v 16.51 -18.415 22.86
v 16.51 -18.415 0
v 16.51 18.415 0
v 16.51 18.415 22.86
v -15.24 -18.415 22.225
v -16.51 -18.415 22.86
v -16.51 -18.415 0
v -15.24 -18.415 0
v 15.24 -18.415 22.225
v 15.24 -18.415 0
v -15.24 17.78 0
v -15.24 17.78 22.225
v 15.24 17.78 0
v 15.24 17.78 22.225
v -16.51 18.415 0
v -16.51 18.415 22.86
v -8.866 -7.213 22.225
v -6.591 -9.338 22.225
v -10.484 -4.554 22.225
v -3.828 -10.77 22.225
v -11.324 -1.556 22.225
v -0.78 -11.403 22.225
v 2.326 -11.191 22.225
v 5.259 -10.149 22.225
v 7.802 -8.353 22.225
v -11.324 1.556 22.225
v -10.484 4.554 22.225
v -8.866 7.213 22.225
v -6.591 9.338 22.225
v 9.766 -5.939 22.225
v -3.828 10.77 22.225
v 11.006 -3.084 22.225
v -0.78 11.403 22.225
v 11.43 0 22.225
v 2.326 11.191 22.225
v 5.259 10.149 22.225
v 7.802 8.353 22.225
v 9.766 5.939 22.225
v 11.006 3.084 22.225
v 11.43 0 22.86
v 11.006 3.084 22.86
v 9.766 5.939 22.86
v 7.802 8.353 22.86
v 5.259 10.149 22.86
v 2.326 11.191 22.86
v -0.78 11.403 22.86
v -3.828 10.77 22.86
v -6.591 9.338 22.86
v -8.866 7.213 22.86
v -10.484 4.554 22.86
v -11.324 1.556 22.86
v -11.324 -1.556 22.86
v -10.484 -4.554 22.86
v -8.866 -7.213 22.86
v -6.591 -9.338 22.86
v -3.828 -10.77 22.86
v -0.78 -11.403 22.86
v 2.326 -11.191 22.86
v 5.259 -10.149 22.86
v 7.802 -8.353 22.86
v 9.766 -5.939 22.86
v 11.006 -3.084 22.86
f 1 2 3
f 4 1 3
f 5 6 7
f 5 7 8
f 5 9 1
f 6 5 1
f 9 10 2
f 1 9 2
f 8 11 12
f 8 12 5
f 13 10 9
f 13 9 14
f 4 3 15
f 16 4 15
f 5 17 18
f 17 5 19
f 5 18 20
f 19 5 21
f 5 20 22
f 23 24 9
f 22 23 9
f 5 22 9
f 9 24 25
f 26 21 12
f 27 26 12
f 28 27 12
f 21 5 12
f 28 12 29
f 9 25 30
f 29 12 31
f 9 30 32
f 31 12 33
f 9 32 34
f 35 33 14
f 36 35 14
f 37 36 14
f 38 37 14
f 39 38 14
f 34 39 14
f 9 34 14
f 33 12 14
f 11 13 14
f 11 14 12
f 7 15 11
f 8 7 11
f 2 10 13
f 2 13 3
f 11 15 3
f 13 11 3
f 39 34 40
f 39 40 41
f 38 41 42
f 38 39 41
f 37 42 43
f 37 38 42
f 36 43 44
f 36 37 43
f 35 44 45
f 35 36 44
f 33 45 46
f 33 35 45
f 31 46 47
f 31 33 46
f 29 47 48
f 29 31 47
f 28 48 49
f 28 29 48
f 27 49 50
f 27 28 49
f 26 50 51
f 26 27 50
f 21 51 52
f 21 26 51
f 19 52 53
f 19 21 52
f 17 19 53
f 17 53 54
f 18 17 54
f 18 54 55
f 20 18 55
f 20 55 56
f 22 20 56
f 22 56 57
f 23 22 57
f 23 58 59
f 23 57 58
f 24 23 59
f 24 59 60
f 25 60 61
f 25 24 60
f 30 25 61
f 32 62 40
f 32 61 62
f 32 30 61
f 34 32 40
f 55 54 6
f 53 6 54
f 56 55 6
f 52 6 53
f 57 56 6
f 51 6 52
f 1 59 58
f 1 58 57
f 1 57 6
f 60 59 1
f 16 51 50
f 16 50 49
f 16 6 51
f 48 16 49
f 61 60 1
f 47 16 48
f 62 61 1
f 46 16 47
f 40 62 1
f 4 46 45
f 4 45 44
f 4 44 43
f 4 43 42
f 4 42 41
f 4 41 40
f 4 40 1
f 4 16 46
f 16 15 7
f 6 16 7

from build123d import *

# Parameters (mm, degrees)
F1_DEPTH = 22.86
F2_R     = 11.43
F3_DEPTH = 22.861
F5_DEPTH = 22.225
F7_DEPTH = 11.9126


with BuildPart() as f1:
    # F0 (on Top) → F1 (new body)
    with BuildSketch(Plane.XY):
        Polygon((-16.51, 18.415), (-16.51, 0), (-16.51, -18.415), (16.51, -18.415), (16.51, 18.415), align=None)
    extrude(amount=F1_DEPTH)

    # F2 (on Top) → F3 (cut, through all)
    with BuildSketch(Plane.XY):
        Circle(F2_R)
    extrude(amount=F3_DEPTH, mode=Mode.SUBTRACT)

    # F4 (on Top) → F5 (cut)
    with BuildSketch(Plane.XY):
        Polygon((-15.24, 17.78), (-15.24, 0), (-15.24, -17.78), (-15.24, -25.4), (15.24, -25.4), (15.24, -17.78), (15.24, 17.78), align=None)
    extrude(amount=F5_DEPTH, mode=Mode.SUBTRACT)

    # F6 (on Top) → F7 (cut)
    with BuildSketch(Plane.XY):
        Polygon((12.568022, 0), (0, 0), (-12.568022, 0), (-12.568022, -23.286249), (12.568022, -23.286249), align=None)
    extrude(amount=F7_DEPTH, mode=Mode.SUBTRACT)


solid = f1.part
